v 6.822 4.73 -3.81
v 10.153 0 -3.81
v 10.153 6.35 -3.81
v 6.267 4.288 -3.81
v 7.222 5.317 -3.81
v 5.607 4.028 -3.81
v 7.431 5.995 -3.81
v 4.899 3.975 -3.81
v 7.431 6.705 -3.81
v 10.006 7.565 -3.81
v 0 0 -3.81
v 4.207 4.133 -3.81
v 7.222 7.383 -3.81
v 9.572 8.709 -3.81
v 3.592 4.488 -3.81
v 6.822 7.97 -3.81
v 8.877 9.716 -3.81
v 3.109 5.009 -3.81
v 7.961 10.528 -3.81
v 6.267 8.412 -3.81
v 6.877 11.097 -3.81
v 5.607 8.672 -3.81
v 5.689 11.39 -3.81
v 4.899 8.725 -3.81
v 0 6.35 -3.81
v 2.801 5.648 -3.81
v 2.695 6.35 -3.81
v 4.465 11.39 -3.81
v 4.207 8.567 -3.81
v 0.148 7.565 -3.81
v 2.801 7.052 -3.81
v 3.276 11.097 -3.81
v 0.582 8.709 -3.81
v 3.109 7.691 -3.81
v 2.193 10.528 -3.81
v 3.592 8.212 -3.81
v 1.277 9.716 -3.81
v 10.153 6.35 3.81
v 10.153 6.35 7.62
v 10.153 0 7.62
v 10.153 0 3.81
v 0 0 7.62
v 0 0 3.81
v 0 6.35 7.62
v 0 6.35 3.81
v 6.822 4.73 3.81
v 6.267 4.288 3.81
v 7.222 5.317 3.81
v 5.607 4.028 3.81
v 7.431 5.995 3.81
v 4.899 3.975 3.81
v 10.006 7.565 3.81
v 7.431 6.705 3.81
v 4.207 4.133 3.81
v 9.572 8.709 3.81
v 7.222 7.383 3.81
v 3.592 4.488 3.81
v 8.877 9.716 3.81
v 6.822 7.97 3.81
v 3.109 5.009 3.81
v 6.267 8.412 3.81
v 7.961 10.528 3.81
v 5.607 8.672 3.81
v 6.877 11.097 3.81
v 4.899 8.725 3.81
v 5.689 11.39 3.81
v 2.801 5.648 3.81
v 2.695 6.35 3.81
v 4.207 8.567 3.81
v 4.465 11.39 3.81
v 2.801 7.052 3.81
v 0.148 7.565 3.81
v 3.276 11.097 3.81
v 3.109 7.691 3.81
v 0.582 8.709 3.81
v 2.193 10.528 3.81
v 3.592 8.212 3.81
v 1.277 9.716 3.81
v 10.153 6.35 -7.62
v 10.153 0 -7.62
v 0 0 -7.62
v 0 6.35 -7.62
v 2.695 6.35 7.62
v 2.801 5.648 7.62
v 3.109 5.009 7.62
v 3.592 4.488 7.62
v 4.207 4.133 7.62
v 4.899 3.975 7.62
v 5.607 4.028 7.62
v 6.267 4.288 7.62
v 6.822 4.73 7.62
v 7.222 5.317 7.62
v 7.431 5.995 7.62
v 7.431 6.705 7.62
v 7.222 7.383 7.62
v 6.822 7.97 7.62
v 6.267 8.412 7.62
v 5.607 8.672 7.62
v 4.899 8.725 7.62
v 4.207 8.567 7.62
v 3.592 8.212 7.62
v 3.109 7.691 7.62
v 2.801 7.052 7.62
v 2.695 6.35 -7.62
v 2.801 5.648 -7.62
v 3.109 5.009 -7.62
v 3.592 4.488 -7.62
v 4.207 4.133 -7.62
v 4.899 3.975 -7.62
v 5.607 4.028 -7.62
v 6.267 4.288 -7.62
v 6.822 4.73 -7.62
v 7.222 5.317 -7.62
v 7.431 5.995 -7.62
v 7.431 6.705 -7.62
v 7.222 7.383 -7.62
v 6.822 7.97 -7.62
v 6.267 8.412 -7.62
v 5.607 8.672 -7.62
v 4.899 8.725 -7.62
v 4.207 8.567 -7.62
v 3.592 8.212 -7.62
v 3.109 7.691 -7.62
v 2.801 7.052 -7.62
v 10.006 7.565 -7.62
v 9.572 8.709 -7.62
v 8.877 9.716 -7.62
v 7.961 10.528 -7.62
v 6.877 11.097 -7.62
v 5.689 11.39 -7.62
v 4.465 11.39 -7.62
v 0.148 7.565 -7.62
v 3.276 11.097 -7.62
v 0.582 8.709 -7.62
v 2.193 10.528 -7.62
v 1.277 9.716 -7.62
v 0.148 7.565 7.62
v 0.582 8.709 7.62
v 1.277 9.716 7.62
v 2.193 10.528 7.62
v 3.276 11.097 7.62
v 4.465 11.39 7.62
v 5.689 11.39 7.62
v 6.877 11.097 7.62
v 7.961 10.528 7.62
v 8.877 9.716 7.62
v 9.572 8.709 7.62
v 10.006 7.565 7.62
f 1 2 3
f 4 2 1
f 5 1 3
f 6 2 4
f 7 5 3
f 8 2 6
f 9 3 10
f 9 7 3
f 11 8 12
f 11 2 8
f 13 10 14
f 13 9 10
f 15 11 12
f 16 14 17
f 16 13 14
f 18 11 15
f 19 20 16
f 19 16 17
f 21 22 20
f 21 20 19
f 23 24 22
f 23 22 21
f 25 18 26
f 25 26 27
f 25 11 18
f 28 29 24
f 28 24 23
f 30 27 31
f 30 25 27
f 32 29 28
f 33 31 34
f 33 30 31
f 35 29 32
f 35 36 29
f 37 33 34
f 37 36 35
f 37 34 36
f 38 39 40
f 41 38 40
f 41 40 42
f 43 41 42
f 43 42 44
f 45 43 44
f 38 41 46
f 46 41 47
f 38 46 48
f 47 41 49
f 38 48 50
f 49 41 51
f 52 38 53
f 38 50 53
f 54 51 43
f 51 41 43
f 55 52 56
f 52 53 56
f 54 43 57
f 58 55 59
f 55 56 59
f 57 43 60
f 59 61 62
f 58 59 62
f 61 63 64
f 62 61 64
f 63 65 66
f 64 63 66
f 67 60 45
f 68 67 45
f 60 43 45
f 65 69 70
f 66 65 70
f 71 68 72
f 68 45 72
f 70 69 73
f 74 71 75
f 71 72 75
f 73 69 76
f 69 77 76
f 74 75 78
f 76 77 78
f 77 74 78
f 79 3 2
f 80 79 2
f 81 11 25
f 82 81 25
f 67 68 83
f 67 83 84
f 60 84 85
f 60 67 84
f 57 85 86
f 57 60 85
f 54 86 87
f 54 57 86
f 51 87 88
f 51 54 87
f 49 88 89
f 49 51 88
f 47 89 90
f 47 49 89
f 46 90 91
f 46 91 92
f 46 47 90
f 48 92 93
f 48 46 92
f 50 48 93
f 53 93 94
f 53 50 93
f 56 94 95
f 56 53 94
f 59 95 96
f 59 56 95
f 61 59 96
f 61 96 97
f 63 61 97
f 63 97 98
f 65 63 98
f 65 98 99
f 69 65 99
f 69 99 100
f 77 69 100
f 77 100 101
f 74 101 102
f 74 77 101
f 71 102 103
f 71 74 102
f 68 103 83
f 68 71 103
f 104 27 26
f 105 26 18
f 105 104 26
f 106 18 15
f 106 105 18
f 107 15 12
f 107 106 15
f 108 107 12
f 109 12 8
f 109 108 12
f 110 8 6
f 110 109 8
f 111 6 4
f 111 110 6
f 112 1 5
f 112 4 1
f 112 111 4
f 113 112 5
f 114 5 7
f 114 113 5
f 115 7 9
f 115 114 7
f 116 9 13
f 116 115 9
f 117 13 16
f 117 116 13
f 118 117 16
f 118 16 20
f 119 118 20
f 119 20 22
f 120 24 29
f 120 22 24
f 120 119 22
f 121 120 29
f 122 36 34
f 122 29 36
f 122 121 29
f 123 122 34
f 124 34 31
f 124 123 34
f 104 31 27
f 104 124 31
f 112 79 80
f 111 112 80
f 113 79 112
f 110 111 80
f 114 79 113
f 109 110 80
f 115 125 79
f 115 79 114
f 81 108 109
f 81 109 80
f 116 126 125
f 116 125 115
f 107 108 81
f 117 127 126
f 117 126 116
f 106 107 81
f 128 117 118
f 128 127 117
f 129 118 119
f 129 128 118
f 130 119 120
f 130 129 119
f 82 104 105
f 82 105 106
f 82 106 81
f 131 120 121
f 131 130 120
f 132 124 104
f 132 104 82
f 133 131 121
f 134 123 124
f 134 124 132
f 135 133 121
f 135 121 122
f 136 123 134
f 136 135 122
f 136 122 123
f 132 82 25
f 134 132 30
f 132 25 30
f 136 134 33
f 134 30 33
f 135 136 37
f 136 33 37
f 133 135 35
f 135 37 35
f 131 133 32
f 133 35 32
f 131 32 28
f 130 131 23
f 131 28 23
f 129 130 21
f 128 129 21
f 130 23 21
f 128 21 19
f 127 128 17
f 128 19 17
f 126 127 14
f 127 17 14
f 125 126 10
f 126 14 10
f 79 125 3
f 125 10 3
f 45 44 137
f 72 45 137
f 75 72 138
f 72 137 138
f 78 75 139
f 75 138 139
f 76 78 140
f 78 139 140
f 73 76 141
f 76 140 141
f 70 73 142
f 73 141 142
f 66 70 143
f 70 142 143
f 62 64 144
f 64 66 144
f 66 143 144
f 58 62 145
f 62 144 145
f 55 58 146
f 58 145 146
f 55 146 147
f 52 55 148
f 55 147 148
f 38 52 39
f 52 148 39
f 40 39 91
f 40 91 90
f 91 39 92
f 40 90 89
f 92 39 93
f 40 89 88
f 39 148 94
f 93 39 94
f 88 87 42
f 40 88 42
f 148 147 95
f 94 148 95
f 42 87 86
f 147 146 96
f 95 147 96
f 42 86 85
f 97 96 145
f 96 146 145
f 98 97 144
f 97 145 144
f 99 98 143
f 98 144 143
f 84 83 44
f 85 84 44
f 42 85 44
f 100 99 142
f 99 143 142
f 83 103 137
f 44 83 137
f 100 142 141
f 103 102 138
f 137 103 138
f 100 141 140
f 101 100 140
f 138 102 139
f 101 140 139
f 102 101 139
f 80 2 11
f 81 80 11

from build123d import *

# Parameters (mm, degrees)
SKETCH1_R           = 2.38125
BOSS_EXTRUDE1_DEPTH = 7.62
SKETCH2_W           = 7.62
SKETCH2_H           = 24.17124054
CUT_EXTRUDE1_DEPTH  = 25.4


with BuildPart() as part:
    # Sketch1 → Boss-Extrude1 (new, symmetric)
    with BuildSketch(Plane.XY):
        with BuildLine():
            ThreePointArc((0, 6.35), (5.076656873, 11.426656873), (10.153313745, 6.35))
            Line((10.153313745, 6.35), (10.153313745, 0))
            Line((10.153313745, 0), (0, 0))
            Line((0, 0), (0, 6.35))
        make_face()
        with Locations(Location((5.076656873, 6.35, 0), (0, 0, 180))):
            Circle(SKETCH1_R, mode=Mode.SUBTRACT)
    extrude(amount=BOSS_EXTRUDE1_DEPTH, both=True)

    # Sketch2 → Cut-Extrude1 (cut)
    with BuildSketch(Plane.ZY):
        with Locations((0, 12.08562027)):
            Rectangle(SKETCH2_W, SKETCH2_H)
    extrude(amount=-CUT_EXTRUDE1_DEPTH, mode=Mode.SUBTRACT)


with BuildPart() as cut_extrude1_piece_1:
    # of the separate pieces the step leaves, piece 1, a body of its own (cut_extrude1_pieces)
    add(part.part.solids().sort_by_distance((10.153313745, 6.35, -7.62))[0])


with BuildPart() as cut_extrude1_piece_2:
    # of the separate pieces the step leaves, piece 2, a body of its own (cut_extrude1_pieces)
    add(part.part.solids().sort_by_distance((10.153313745, 6.35, 3.81))[0])


solid = Compound([cut_extrude1_piece_1.part, cut_extrude1_piece_2.part])
